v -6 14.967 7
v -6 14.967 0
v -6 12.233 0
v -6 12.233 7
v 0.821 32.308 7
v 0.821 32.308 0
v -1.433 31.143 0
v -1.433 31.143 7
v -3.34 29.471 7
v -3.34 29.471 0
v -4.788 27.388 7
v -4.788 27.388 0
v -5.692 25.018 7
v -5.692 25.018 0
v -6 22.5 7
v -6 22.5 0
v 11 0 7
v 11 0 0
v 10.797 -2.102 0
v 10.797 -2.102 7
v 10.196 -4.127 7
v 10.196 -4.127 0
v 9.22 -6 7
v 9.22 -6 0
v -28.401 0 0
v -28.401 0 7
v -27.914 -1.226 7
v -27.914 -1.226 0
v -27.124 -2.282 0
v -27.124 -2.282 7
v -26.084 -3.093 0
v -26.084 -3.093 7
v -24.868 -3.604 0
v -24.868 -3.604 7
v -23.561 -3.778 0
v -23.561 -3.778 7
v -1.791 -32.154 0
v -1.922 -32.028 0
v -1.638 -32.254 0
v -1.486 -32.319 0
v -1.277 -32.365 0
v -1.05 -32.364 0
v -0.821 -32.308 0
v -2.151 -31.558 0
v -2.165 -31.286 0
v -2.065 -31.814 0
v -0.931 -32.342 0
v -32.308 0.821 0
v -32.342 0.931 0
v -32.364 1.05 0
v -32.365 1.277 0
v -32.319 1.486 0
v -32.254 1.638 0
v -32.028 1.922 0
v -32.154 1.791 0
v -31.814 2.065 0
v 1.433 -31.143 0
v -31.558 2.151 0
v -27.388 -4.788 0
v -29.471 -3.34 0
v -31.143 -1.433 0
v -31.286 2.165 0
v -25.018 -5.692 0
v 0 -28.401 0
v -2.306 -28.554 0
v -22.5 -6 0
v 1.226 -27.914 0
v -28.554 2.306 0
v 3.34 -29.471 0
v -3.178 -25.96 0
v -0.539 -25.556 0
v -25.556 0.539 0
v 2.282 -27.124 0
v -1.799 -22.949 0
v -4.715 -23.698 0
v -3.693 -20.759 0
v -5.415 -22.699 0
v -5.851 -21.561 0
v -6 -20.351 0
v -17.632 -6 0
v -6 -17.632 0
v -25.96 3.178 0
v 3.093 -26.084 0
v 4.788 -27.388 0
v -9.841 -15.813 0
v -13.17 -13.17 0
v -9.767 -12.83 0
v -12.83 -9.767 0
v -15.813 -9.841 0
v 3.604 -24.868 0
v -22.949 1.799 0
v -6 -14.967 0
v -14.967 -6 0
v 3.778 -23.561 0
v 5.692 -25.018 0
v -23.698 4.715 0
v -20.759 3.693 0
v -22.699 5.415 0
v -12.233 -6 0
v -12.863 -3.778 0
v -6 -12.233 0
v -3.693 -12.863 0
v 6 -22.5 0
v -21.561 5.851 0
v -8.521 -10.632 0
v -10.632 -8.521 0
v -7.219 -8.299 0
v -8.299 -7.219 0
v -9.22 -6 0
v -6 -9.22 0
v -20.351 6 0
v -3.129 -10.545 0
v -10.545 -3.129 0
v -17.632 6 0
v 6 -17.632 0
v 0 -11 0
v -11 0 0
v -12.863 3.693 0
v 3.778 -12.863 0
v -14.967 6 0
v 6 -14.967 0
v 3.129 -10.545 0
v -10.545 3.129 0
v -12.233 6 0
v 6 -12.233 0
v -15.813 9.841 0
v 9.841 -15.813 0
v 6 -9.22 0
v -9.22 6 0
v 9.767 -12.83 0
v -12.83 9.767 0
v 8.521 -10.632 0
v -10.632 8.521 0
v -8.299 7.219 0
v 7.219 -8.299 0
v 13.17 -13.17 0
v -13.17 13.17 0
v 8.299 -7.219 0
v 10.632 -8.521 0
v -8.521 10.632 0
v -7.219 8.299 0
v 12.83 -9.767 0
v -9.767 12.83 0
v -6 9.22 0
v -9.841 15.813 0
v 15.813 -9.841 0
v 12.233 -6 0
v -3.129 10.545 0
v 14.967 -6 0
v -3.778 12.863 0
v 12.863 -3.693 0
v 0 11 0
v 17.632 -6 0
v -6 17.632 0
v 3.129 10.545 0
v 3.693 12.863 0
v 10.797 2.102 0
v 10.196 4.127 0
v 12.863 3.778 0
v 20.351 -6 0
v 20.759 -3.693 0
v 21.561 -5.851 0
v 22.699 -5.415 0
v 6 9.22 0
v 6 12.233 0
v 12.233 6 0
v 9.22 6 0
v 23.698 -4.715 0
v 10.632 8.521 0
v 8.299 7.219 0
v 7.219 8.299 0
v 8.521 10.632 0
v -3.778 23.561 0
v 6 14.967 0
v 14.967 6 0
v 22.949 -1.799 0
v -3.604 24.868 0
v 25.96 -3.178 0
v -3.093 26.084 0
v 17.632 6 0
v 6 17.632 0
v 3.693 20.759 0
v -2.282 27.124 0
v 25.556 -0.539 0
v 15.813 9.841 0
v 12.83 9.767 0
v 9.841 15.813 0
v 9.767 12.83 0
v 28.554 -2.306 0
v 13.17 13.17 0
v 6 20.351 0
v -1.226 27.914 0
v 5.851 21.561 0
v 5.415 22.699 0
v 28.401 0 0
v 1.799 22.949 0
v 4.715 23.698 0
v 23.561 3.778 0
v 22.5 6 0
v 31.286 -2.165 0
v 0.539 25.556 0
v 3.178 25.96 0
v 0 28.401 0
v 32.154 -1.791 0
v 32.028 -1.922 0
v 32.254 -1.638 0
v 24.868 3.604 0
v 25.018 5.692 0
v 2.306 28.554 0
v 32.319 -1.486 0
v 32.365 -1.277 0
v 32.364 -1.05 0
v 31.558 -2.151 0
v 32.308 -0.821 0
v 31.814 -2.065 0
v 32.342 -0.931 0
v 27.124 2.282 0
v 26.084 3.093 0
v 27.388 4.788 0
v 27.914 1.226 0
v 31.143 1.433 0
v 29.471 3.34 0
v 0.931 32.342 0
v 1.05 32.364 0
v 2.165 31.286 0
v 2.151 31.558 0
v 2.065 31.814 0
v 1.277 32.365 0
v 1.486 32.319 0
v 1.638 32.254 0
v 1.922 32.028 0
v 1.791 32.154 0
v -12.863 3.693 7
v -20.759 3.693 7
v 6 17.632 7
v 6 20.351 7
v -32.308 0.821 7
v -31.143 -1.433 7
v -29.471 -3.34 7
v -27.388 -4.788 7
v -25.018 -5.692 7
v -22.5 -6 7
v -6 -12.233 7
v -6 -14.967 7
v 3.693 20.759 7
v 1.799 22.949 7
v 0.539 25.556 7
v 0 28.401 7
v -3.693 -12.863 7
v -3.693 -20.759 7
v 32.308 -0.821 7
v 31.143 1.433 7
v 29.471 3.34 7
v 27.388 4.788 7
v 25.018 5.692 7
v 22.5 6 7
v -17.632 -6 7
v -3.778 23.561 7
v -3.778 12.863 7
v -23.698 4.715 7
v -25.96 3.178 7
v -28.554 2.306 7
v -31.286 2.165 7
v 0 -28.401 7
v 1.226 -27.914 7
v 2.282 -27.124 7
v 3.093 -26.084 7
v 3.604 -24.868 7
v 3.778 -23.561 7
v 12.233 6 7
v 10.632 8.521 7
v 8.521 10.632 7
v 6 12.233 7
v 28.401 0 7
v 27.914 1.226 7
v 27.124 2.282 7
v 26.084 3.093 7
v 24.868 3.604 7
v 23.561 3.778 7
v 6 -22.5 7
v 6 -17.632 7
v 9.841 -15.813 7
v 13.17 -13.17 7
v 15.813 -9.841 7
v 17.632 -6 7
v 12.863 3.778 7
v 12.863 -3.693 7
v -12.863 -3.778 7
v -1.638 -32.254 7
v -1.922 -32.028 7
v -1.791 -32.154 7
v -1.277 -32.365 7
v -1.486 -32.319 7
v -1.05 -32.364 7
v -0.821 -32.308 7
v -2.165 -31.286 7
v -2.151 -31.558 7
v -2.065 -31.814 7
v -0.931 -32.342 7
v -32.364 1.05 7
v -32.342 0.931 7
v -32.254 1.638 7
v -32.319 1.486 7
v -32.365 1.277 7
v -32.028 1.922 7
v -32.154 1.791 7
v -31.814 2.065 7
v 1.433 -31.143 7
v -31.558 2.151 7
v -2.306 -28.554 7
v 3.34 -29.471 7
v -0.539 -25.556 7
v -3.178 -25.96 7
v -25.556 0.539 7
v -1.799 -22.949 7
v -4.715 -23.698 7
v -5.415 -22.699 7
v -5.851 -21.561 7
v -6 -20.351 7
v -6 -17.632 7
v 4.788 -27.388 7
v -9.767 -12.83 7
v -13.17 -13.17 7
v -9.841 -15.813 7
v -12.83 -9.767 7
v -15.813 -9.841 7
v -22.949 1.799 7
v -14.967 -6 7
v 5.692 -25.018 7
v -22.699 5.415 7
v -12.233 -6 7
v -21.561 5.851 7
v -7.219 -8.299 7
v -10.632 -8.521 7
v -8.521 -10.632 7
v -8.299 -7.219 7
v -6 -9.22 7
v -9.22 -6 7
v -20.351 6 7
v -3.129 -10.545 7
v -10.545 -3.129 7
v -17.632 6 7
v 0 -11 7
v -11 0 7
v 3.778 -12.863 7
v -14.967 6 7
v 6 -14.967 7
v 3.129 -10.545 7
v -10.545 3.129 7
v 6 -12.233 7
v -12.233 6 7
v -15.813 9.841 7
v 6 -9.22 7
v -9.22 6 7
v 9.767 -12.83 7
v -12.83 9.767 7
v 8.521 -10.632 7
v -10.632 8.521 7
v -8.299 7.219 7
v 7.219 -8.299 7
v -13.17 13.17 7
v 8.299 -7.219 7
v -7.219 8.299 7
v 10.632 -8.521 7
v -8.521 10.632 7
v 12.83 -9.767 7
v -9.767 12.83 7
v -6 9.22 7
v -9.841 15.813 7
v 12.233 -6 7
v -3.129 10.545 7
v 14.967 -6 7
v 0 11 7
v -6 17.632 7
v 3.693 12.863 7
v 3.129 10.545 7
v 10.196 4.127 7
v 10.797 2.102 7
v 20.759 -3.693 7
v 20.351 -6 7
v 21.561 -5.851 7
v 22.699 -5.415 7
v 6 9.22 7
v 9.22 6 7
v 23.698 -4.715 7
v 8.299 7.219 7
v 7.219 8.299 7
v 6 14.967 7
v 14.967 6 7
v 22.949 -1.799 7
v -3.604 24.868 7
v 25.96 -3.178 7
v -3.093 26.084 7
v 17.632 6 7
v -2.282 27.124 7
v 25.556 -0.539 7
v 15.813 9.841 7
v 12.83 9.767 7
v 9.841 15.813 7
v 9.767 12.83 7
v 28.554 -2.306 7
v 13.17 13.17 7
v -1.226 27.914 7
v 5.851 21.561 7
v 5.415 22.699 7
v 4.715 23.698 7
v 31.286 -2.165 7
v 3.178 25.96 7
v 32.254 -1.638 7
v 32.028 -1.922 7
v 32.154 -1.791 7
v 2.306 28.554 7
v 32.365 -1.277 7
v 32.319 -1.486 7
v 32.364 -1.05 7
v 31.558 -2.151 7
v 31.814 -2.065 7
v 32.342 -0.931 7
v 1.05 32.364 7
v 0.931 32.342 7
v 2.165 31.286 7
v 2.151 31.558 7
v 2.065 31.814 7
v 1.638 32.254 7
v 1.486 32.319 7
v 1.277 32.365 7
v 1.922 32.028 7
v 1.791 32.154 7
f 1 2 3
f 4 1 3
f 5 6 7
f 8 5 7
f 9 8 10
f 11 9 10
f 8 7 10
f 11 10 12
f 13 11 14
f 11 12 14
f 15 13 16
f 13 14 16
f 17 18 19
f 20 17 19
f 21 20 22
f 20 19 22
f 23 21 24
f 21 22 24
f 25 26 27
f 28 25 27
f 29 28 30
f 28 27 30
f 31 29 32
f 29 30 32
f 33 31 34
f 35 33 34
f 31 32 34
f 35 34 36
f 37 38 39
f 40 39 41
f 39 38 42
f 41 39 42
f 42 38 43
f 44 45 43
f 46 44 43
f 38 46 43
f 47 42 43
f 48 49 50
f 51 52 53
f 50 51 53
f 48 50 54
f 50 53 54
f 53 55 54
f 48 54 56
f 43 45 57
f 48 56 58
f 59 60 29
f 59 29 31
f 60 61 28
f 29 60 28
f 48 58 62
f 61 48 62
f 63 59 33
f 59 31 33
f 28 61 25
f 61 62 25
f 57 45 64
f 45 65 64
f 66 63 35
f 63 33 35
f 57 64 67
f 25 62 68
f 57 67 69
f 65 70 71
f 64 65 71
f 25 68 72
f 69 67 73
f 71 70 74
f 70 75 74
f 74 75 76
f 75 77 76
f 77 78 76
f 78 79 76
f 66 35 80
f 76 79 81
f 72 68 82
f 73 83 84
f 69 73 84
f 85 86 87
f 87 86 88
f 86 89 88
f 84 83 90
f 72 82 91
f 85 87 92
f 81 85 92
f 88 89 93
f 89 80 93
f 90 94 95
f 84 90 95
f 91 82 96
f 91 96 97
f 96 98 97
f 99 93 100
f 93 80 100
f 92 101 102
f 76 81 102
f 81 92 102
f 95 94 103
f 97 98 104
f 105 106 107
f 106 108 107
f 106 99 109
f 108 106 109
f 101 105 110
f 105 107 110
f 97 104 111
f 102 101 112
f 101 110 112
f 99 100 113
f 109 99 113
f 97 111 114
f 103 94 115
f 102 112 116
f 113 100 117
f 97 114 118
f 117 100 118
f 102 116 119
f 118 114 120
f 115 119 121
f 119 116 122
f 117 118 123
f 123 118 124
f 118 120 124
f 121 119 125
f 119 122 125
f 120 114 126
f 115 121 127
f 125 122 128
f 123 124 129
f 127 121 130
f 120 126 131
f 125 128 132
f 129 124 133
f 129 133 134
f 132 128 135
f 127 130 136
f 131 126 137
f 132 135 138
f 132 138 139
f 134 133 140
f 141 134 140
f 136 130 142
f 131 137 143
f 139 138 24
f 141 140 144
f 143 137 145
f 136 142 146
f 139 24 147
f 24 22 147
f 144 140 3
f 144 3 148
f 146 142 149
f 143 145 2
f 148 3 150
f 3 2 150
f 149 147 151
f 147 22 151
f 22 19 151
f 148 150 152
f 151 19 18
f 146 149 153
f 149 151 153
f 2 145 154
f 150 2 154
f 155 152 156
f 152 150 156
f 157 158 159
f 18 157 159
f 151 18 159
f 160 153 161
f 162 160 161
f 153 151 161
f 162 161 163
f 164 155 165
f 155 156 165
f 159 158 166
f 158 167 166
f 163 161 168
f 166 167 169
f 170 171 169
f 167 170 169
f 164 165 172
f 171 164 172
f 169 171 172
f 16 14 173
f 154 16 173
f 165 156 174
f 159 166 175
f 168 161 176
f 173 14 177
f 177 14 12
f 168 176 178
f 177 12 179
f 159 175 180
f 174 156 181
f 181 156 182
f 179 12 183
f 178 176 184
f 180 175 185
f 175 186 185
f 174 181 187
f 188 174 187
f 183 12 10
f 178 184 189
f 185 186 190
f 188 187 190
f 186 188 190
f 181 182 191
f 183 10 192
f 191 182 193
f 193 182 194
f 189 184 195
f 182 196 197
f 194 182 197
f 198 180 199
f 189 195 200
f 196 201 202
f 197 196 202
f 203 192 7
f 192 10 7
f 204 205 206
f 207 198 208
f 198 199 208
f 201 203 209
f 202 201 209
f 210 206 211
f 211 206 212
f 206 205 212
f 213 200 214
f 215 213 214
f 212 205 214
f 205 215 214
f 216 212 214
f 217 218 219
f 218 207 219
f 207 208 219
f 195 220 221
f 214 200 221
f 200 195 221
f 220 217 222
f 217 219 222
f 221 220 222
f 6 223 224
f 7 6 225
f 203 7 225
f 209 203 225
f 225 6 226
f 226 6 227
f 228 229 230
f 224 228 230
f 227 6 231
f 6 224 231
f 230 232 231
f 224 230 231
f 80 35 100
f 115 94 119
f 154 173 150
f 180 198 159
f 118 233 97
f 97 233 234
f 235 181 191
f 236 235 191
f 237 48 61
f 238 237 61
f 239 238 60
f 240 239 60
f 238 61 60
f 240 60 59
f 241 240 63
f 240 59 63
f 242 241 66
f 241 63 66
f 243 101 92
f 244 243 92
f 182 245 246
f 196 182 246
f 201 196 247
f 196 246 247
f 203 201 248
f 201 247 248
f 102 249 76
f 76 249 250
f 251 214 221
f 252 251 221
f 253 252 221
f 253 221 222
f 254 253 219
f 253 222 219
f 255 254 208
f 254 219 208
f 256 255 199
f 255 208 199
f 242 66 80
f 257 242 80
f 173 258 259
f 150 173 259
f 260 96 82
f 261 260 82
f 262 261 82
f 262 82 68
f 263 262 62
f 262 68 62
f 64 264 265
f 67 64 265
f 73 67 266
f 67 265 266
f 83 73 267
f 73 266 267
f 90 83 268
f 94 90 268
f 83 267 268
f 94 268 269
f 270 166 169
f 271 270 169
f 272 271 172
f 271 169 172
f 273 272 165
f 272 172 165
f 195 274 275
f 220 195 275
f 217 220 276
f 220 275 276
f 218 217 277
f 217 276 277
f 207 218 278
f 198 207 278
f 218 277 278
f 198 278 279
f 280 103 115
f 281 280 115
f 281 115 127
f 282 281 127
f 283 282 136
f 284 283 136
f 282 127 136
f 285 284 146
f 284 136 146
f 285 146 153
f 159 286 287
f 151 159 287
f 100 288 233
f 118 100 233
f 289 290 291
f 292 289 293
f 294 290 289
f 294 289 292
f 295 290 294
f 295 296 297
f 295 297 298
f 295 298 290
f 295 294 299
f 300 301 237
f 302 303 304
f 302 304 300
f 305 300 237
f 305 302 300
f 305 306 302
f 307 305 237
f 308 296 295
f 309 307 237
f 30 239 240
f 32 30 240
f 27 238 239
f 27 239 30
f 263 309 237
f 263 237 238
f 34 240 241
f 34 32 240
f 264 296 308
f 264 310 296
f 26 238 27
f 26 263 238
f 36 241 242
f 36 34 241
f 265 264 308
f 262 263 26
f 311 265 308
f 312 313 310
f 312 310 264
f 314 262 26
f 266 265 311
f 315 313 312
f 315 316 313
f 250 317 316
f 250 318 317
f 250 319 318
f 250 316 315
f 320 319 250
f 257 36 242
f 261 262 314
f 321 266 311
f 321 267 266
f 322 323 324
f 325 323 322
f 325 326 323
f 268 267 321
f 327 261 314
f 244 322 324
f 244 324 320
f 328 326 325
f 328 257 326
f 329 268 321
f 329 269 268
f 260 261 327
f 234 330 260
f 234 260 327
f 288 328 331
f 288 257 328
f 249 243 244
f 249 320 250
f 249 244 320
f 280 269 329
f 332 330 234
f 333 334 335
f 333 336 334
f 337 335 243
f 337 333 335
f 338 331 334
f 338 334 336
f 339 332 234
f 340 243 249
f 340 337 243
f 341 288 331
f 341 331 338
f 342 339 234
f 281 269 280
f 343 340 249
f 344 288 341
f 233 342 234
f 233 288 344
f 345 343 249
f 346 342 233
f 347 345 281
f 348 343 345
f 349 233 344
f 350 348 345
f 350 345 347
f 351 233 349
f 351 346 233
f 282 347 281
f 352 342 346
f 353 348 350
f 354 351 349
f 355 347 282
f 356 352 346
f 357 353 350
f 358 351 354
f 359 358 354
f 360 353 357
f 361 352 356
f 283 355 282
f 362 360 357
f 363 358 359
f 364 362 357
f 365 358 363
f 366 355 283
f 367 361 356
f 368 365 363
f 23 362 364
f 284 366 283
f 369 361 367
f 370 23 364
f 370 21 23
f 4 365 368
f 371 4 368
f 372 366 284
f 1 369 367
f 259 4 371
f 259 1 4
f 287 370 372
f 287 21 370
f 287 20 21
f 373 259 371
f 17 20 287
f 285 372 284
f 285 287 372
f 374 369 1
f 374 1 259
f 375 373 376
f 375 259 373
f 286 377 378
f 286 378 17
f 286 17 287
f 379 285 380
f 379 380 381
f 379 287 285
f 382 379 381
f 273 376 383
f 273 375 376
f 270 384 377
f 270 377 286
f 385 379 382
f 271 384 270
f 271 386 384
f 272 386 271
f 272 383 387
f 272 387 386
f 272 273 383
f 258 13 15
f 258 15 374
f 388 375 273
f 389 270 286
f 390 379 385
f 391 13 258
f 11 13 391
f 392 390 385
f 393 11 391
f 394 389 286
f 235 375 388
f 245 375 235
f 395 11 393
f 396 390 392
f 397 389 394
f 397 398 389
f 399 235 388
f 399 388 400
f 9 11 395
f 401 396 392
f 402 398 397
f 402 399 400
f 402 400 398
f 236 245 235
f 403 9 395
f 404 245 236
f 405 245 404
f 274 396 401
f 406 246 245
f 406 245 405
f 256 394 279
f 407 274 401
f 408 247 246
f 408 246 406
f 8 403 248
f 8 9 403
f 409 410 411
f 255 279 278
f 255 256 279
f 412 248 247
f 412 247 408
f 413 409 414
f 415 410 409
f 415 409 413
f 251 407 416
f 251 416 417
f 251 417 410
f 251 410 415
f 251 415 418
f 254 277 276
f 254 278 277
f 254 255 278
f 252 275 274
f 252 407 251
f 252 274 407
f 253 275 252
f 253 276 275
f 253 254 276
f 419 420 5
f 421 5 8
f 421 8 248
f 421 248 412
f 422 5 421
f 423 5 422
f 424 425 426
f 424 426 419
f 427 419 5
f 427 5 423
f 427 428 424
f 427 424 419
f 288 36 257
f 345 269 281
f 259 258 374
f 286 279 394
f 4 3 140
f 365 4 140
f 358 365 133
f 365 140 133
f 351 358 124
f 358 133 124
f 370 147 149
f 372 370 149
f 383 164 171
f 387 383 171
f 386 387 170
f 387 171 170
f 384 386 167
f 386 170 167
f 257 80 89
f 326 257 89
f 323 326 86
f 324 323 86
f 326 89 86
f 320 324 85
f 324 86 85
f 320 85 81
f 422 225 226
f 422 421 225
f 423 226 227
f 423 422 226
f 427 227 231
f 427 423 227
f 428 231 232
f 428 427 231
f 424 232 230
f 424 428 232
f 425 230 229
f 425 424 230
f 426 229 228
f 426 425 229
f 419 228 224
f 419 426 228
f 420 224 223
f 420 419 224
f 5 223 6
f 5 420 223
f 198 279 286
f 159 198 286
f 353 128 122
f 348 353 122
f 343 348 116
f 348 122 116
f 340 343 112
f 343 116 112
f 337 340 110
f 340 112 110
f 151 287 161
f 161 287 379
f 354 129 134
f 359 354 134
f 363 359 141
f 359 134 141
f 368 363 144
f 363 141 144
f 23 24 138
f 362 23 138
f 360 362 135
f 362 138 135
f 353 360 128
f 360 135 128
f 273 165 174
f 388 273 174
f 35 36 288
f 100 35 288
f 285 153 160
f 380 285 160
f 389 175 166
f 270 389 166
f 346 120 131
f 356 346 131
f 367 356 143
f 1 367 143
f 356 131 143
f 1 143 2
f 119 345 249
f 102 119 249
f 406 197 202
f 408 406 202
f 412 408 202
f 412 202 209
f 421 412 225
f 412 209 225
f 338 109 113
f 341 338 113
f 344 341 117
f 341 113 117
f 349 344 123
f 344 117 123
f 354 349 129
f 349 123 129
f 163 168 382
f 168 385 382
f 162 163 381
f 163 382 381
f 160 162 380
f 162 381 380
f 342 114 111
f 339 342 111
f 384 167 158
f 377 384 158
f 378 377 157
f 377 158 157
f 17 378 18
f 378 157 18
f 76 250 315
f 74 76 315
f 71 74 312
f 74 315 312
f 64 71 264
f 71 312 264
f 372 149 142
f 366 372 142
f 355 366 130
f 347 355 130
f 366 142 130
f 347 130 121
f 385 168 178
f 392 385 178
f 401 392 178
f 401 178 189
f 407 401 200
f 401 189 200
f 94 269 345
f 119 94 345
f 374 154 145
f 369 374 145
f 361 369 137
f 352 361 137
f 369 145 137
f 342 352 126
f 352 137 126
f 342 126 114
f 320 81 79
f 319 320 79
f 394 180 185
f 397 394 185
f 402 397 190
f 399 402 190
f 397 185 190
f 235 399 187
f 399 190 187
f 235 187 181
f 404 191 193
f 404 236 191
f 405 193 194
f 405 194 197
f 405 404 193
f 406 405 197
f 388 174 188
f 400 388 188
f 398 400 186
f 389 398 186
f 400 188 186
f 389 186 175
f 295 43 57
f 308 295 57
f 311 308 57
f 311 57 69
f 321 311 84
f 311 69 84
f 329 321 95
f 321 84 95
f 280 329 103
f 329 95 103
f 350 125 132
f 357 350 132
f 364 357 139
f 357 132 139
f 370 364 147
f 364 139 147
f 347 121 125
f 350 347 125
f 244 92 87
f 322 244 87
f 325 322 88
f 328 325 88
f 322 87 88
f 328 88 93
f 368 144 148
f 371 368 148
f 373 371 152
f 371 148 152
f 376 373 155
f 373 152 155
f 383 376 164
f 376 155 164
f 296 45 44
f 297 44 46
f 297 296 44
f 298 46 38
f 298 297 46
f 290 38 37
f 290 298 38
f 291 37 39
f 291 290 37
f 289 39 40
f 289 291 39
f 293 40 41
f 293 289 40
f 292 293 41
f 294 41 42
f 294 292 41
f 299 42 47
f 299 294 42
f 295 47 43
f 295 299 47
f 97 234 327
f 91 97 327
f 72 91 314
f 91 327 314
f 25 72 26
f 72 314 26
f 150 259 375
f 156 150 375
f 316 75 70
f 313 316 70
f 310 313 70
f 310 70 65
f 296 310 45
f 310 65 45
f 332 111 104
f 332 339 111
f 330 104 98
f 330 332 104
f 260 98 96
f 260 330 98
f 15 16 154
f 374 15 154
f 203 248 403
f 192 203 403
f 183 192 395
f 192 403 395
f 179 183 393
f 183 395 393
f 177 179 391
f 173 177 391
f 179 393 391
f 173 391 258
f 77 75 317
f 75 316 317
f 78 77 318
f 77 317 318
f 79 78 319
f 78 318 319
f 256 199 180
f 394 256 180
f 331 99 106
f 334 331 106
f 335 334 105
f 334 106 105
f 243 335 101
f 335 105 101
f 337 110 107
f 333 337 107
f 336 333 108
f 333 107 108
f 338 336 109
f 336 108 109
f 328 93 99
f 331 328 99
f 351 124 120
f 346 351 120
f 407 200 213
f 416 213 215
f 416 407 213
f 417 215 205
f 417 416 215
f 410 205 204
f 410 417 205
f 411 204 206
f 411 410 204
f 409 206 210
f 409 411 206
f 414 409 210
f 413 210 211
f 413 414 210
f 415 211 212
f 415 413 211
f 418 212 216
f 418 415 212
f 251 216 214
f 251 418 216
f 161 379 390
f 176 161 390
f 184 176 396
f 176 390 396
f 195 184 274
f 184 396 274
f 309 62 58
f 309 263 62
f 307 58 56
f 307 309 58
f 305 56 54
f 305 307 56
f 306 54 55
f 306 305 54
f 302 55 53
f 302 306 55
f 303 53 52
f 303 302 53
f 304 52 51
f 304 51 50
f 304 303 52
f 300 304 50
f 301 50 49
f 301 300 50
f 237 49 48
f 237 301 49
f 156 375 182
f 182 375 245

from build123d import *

# Parameters (mm, degrees)
F1_DEPTH = 7
F2_R     = 1
F3_R     = 5
F5_DEPTH = 25


# Not quite as in the source:
# - a feature names something its author has since deleted; it is built from what else it names


with BuildPart() as f1:
    # F0 (on Top) → F1 (new body)
    with BuildSketch(Plane.XY):
        with BuildLine():
            ThreePointArc((6, 14.9671515326), (11.4020968466, 11.4020968466), (14.9671515326, 6))
            Line((14.9671515326, 6), (17.6320907722, 6))
            ThreePointArc((17.6320907722, 6), (13.1698637996, 13.1698637996), (6, 17.6320907722))
            Line((6, 17.6320907722), (6, 14.9671515326))
        make_face()
        with BuildLine():
            Line((17.6320907722, 6), (14.9671515326, 6))
            ThreePointArc((14.9671515326, 6), (15.8328920836, 3.0553483056), (16.125, 0))
            ThreePointArc((16.125, 0), (15.8328920836, -3.0553483056), (14.9671515326, -6))
            Line((14.9671515326, -6), (17.6320907722, -6))
            ThreePointArc((17.6320907722, -6), (18.3750961308, -3.0408004183), (18.625, 0))
            ThreePointArc((18.625, 0), (18.3750961308, 3.0408004183), (17.6320907722, 6))
        make_face()
        with BuildLine():
            Line((17.6320907722, -6), (14.9671515326, -6))
            ThreePointArc((14.9671515326, -6), (11.4020968466, -11.4020968466), (6, -14.9671515326))
            Line((6, -14.9671515326), (6, -17.6320907722))
            ThreePointArc((6, -17.6320907722), (13.1698637996, -13.1698637996), (17.6320907722, -6))
        make_face()
        with BuildLine():
            ThreePointArc((-6, 14.9671515326), (0, 16.125), (6, 14.9671515326))
            Line((6, 14.9671515326), (6, 17.6320907722))
            ThreePointArc((6, 17.6320907722), (0, 18.625), (-6, 17.6320907722))
            Line((-6, 17.6320907722), (-6, 14.9671515326))
        make_face()
        with BuildLine():
            Line((22.5, 6), (17.6320907722, 6))
            ThreePointArc((17.6320907722, 6), (18.3750961308, 3.0408004183), (18.625, 0))
            ThreePointArc((18.625, 0), (18.3750961308, -3.0408004183), (17.6320907722, -6))
            Line((17.6320907722, -6), (22.5, -6))
            Line((22.5, -6), (22.5, 6))
        make_face()
        with BuildLine():
            Line((6, -17.6320907722), (6, -14.9671515326))
            ThreePointArc((6, -14.9671515326), (0, -16.125), (-6, -14.9671515326))
            Line((-6, -14.9671515326), (-6, -17.6320907722))
            ThreePointArc((-6, -17.6320907722), (0, -18.625), (6, -17.6320907722))
        make_face()
        with BuildLine():
            ThreePointArc((-14.9671515326, 6), (-11.4020968466, 11.4020968466), (-6, 14.9671515326))
            Line((-6, 14.9671515326), (-6, 17.6320907722))
            ThreePointArc((-6, 17.6320907722), (-13.1698637996, 13.1698637996), (-17.6320907722, 6))
            Line((-17.6320907722, 6), (-14.9671515326, 6))
        make_face()
        with BuildLine():
            ThreePointArc((-6, 17.6320907722), (0, 18.625), (6, 17.6320907722))
            Line((6, 17.6320907722), (6, 22.5))
            Line((6, 22.5), (-6, 22.5))
            Line((-6, 22.5), (-6, 17.6320907722))
        make_face()
        with BuildLine():
            ThreePointArc((32.757434994, -2.4008296896), (29.1292705505, 3.631764353), (22.5, 6))
            Line((22.5, 6), (22.5, -6))
            ThreePointArc((22.5, -6), (27.1011186164, -2.6967874102), (32.757434994, -2.4008296896))
        make_face()
        with BuildLine():
            Line((-6, -17.6320907722), (-6, -14.9671515326))
            ThreePointArc((-6, -14.9671515326), (-11.4020968466, -11.4020968466), (-14.9671515326, -6))
            Line((-14.9671515326, -6), (-17.6320907722, -6))
            ThreePointArc((-17.6320907722, -6), (-13.1698637996, -13.1698637996), (-6, -17.6320907722))
        make_face()
        with BuildLine():
            Line((6, -22.5), (6, -17.6320907722))
            ThreePointArc((6, -17.6320907722), (0, -18.625), (-6, -17.6320907722))
            Line((-6, -17.6320907722), (-6, -22.5))
            Line((-6, -22.5), (6, -22.5))
        make_face()
        with BuildLine():
            ThreePointArc((-14.9671515326, -6), (-16.125, 0), (-14.9671515326, 6))
            Line((-14.9671515326, 6), (-17.6320907722, 6))
            ThreePointArc((-17.6320907722, 6), (-18.625, 0), (-17.6320907722, -6))
            Line((-17.6320907722, -6), (-14.9671515326, -6))
        make_face()
        with BuildLine():
            Line((-6, 22.5), (6, 22.5))
            ThreePointArc((6, 22.5), (2.6967874102, 27.1011186164), (2.4008296896, 32.757434994))
            ThreePointArc((2.4008296896, 32.757434994), (-3.631764353, 29.1292705505), (-6, 22.5))
        make_face()
        with BuildLine():
            ThreePointArc((-2.4008296896, -32.757434994), (3.631764353, -29.1292705505), (6, -22.5))
            Line((6, -22.5), (-6, -22.5))
            ThreePointArc((-6, -22.5), (-2.6967874102, -27.1011186164), (-2.4008296896, -32.757434994))
        make_face()
        with BuildLine():
            ThreePointArc((-17.6320907722, -6), (-18.625, 0), (-17.6320907722, 6))
            Line((-17.6320907722, 6), (-22.5, 6))
            Line((-22.5, 6), (-22.5, -6))
            Line((-22.5, -6), (-17.6320907722, -6))
        make_face()
        with BuildLine():
            Line((-22.5, -6), (-22.5, 6))
            ThreePointArc((-22.5, 6), (-27.1011186164, 2.6967874102), (-32.757434994, 2.4008296896))
            ThreePointArc((-32.757434994, 2.4008296896), (-29.1292705505, -3.631764353), (-22.5, -6))
        make_face()
        with BuildLine():
            ThreePointArc((-6, 12.2327684929), (0, 13.625), (6, 12.2327684929))
            Line((6, 12.2327684929), (6, 14.9671515326))
            ThreePointArc((6, 14.9671515326), (0, 16.125), (-6, 14.9671515326))
            Line((-6, 14.9671515326), (-6, 12.2327684929))
        make_face()
        with BuildLine():
            ThreePointArc((-6, 9.2195444573), (0, 11), (6, 9.2195444573))
            Line((6, 9.2195444573), (6, 12.2327684929))
            ThreePointArc((6, 12.2327684929), (0, 13.625), (-6, 12.2327684929))
            Line((-6, 12.2327684929), (-6, 9.2195444573))
        make_face()
        with BuildLine():
            ThreePointArc((-12.2327684929, -6), (-13.625, 0), (-12.2327684929, 6))
            Line((-12.2327684929, 6), (-14.9671515326, 6))
            ThreePointArc((-14.9671515326, 6), (-16.125, 0), (-14.9671515326, -6))
            Line((-14.9671515326, -6), (-12.2327684929, -6))
        make_face()
        with BuildLine():
            ThreePointArc((-9.2195444573, -6), (-11, 0), (-9.2195444573, 6))
            Line((-9.2195444573, 6), (-12.2327684929, 6))
            ThreePointArc((-12.2327684929, 6), (-13.625, 0), (-12.2327684929, -6))
            Line((-12.2327684929, -6), (-9.2195444573, -6))
        make_face()
        with BuildLine():
            Line((14.9671515326, 6), (12.2327684929, 6))
            ThreePointArc((12.2327684929, 6), (13.2723791333, 3.0797040673), (13.625, 0))
            ThreePointArc((13.625, 0), (13.2723791333, -3.0797040673), (12.2327684929, -6))
            Line((12.2327684929, -6), (14.9671515326, -6))
            ThreePointArc((14.9671515326, -6), (15.8328920836, -3.0553483056), (16.125, 0))
            ThreePointArc((16.125, 0), (15.8328920836, 3.0553483056), (14.9671515326, 6))
        make_face()
        with BuildLine():
            ThreePointArc((9.2195444573, 6), (10.5454964091, 3.129297922), (11, 0))
            ThreePointArc((11, 0), (10.5454964091, -3.129297922), (9.2195444573, -6))
            Line((9.2195444573, -6), (12.2327684929, -6))
            ThreePointArc((12.2327684929, -6), (13.2723791333, -3.0797040673), (13.625, 0))
            ThreePointArc((13.625, 0), (13.2723791333, 3.0797040673), (12.2327684929, 6))
            Line((12.2327684929, 6), (9.2195444573, 6))
        make_face()
        with BuildLine():
            Line((6, -14.9671515326), (6, -12.2327684929))
            ThreePointArc((6, -12.2327684929), (0, -13.625), (-6, -12.2327684929))
            Line((-6, -12.2327684929), (-6, -14.9671515326))
            ThreePointArc((-6, -14.9671515326), (0, -16.125), (6, -14.9671515326))
        make_face()
        with BuildLine():
            Line((6, -12.2327684929), (6, -9.2195444573))
            ThreePointArc((6, -9.2195444573), (0, -11), (-6, -9.2195444573))
            Line((-6, -9.2195444573), (-6, -12.2327684929))
            ThreePointArc((-6, -12.2327684929), (0, -13.625), (6, -12.2327684929))
        make_face()
        with BuildLine():
            ThreePointArc((-9.2195444573, 6), (-7.7781745931, 7.7781745931), (-6, 9.2195444573))
            Line((-6, 9.2195444573), (-6, 12.2327684929))
            ThreePointArc((-6, 12.2327684929), (-9.6343298937, 9.6343298937), (-12.2327684929, 6))
            Line((-12.2327684929, 6), (-9.2195444573, 6))
        make_face()
        with BuildLine():
            ThreePointArc((6, 9.2195444573), (7.7781745931, 7.7781745931), (9.2195444573, 6))
            Line((9.2195444573, 6), (12.2327684929, 6))
            ThreePointArc((12.2327684929, 6), (9.6343298937, 9.6343298937), (6, 12.2327684929))
            Line((6, 12.2327684929), (6, 9.2195444573))
        make_face()
        with BuildLine():
            Line((12.2327684929, -6), (9.2195444573, -6))
            ThreePointArc((9.2195444573, -6), (7.7781745931, -7.7781745931), (6, -9.2195444573))
            Line((6, -9.2195444573), (6, -12.2327684929))
            ThreePointArc((6, -12.2327684929), (9.6343298937, -9.6343298937), (12.2327684929, -6))
        make_face()
        with BuildLine():
            Line((-6, -12.2327684929), (-6, -9.2195444573))
            ThreePointArc((-6, -9.2195444573), (-7.7781745931, -7.7781745931), (-9.2195444573, -6))
            Line((-9.2195444573, -6), (-12.2327684929, -6))
            ThreePointArc((-12.2327684929, -6), (-9.6343298937, -9.6343298937), (-6, -12.2327684929))
        make_face()
    extrude(amount=F1_DEPTH)

    # F2
    f2_edges = [f1.edges().sort_by_distance(p)[0] for p in [
        (-2.40083, -32.757435, 3.5),
        (-32.757435, 2.40083, 3.5),
        (32.757435, -2.40083, 3.5),
        (2.40083, 32.757435, 3.5),
    ]]
    fillet(f2_edges, radius=F2_R)

    # F3
    f3_edges = [f1.edges().sort_by_distance(p)[0] for p in [
        (-22.5, 6, 3.5),
        (6, 22.5, 3.5),
        (22.5, -6, 3.5),
        (-6, -22.5, 3.5),
    ]]
    fillet(f3_edges, radius=F3_R)

    # F4 (on face) → F5 (cut)
    with BuildSketch(Plane.XY.offset(7)):
        with BuildLine():
            ThreePointArc((0, 28.4005012363), (-2.7218256359, 26.630820183), (-3.7782429717, 23.5609523952))
            Line((-3.7782429717, 23.5609523952), (-3.7782429717, 12.8630073741))
            Line((-3.7782429717, 12.8630073741), (3.6933382507, 12.8630073741))
            Line((3.6933382507, 12.8630073741), (3.6933382507, 20.7591112703))
            ThreePointArc((3.6933382507, 20.7591112703), (1.0835977394, 24.21098844), (0, 28.4005012363))
        make_face()
        with BuildLine():
            ThreePointArc((-20.7591112703, 3.6933382507), (-24.21098844, 1.0835977394), (-28.4005012363, 0))
            ThreePointArc((-28.4005012363, 0), (-26.630820183, -2.7218256359), (-23.5609523952, -3.7782429717))
            Line((-23.5609523952, -3.7782429717), (-12.8630073741, -3.7782429717))
            Line((-12.8630073741, -3.7782429717), (-12.8630073741, 3.6933382507))
            Line((-12.8630073741, 3.6933382507), (-20.7591112703, 3.6933382507))
        make_face()
        with BuildLine():
            ThreePointArc((-3.6933382507, -20.7591112703), (-1.0835977394, -24.21098844), (0, -28.4005012363))
            ThreePointArc((0, -28.4005012363), (2.7218256359, -26.630820183), (3.7782429717, -23.5609523952))
            Line((3.7782429717, -23.5609523952), (3.7782429717, -12.8630073741))
            Line((3.7782429717, -12.8630073741), (-3.6933382507, -12.8630073741))
            Line((-3.6933382507, -12.8630073741), (-3.6933382507, -20.7591112703))
        make_face()
        with BuildLine():
            ThreePointArc((20.7591112703, -3.6933382507), (24.21098844, -1.0835977394), (28.4005012363, 0))
            ThreePointArc((28.4005012363, 0), (26.630820183, 2.7218256359), (23.5609523952, 3.7782429717))
            Line((23.5609523952, 3.7782429717), (12.8630073741, 3.7782429717))
            Line((12.8630073741, 3.7782429717), (12.8630073741, -3.6933382507))
            Line((12.8630073741, -3.6933382507), (20.7591112703, -3.6933382507))
        make_face()
    extrude(amount=-F5_DEPTH, mode=Mode.SUBTRACT)


solid = f1.part
